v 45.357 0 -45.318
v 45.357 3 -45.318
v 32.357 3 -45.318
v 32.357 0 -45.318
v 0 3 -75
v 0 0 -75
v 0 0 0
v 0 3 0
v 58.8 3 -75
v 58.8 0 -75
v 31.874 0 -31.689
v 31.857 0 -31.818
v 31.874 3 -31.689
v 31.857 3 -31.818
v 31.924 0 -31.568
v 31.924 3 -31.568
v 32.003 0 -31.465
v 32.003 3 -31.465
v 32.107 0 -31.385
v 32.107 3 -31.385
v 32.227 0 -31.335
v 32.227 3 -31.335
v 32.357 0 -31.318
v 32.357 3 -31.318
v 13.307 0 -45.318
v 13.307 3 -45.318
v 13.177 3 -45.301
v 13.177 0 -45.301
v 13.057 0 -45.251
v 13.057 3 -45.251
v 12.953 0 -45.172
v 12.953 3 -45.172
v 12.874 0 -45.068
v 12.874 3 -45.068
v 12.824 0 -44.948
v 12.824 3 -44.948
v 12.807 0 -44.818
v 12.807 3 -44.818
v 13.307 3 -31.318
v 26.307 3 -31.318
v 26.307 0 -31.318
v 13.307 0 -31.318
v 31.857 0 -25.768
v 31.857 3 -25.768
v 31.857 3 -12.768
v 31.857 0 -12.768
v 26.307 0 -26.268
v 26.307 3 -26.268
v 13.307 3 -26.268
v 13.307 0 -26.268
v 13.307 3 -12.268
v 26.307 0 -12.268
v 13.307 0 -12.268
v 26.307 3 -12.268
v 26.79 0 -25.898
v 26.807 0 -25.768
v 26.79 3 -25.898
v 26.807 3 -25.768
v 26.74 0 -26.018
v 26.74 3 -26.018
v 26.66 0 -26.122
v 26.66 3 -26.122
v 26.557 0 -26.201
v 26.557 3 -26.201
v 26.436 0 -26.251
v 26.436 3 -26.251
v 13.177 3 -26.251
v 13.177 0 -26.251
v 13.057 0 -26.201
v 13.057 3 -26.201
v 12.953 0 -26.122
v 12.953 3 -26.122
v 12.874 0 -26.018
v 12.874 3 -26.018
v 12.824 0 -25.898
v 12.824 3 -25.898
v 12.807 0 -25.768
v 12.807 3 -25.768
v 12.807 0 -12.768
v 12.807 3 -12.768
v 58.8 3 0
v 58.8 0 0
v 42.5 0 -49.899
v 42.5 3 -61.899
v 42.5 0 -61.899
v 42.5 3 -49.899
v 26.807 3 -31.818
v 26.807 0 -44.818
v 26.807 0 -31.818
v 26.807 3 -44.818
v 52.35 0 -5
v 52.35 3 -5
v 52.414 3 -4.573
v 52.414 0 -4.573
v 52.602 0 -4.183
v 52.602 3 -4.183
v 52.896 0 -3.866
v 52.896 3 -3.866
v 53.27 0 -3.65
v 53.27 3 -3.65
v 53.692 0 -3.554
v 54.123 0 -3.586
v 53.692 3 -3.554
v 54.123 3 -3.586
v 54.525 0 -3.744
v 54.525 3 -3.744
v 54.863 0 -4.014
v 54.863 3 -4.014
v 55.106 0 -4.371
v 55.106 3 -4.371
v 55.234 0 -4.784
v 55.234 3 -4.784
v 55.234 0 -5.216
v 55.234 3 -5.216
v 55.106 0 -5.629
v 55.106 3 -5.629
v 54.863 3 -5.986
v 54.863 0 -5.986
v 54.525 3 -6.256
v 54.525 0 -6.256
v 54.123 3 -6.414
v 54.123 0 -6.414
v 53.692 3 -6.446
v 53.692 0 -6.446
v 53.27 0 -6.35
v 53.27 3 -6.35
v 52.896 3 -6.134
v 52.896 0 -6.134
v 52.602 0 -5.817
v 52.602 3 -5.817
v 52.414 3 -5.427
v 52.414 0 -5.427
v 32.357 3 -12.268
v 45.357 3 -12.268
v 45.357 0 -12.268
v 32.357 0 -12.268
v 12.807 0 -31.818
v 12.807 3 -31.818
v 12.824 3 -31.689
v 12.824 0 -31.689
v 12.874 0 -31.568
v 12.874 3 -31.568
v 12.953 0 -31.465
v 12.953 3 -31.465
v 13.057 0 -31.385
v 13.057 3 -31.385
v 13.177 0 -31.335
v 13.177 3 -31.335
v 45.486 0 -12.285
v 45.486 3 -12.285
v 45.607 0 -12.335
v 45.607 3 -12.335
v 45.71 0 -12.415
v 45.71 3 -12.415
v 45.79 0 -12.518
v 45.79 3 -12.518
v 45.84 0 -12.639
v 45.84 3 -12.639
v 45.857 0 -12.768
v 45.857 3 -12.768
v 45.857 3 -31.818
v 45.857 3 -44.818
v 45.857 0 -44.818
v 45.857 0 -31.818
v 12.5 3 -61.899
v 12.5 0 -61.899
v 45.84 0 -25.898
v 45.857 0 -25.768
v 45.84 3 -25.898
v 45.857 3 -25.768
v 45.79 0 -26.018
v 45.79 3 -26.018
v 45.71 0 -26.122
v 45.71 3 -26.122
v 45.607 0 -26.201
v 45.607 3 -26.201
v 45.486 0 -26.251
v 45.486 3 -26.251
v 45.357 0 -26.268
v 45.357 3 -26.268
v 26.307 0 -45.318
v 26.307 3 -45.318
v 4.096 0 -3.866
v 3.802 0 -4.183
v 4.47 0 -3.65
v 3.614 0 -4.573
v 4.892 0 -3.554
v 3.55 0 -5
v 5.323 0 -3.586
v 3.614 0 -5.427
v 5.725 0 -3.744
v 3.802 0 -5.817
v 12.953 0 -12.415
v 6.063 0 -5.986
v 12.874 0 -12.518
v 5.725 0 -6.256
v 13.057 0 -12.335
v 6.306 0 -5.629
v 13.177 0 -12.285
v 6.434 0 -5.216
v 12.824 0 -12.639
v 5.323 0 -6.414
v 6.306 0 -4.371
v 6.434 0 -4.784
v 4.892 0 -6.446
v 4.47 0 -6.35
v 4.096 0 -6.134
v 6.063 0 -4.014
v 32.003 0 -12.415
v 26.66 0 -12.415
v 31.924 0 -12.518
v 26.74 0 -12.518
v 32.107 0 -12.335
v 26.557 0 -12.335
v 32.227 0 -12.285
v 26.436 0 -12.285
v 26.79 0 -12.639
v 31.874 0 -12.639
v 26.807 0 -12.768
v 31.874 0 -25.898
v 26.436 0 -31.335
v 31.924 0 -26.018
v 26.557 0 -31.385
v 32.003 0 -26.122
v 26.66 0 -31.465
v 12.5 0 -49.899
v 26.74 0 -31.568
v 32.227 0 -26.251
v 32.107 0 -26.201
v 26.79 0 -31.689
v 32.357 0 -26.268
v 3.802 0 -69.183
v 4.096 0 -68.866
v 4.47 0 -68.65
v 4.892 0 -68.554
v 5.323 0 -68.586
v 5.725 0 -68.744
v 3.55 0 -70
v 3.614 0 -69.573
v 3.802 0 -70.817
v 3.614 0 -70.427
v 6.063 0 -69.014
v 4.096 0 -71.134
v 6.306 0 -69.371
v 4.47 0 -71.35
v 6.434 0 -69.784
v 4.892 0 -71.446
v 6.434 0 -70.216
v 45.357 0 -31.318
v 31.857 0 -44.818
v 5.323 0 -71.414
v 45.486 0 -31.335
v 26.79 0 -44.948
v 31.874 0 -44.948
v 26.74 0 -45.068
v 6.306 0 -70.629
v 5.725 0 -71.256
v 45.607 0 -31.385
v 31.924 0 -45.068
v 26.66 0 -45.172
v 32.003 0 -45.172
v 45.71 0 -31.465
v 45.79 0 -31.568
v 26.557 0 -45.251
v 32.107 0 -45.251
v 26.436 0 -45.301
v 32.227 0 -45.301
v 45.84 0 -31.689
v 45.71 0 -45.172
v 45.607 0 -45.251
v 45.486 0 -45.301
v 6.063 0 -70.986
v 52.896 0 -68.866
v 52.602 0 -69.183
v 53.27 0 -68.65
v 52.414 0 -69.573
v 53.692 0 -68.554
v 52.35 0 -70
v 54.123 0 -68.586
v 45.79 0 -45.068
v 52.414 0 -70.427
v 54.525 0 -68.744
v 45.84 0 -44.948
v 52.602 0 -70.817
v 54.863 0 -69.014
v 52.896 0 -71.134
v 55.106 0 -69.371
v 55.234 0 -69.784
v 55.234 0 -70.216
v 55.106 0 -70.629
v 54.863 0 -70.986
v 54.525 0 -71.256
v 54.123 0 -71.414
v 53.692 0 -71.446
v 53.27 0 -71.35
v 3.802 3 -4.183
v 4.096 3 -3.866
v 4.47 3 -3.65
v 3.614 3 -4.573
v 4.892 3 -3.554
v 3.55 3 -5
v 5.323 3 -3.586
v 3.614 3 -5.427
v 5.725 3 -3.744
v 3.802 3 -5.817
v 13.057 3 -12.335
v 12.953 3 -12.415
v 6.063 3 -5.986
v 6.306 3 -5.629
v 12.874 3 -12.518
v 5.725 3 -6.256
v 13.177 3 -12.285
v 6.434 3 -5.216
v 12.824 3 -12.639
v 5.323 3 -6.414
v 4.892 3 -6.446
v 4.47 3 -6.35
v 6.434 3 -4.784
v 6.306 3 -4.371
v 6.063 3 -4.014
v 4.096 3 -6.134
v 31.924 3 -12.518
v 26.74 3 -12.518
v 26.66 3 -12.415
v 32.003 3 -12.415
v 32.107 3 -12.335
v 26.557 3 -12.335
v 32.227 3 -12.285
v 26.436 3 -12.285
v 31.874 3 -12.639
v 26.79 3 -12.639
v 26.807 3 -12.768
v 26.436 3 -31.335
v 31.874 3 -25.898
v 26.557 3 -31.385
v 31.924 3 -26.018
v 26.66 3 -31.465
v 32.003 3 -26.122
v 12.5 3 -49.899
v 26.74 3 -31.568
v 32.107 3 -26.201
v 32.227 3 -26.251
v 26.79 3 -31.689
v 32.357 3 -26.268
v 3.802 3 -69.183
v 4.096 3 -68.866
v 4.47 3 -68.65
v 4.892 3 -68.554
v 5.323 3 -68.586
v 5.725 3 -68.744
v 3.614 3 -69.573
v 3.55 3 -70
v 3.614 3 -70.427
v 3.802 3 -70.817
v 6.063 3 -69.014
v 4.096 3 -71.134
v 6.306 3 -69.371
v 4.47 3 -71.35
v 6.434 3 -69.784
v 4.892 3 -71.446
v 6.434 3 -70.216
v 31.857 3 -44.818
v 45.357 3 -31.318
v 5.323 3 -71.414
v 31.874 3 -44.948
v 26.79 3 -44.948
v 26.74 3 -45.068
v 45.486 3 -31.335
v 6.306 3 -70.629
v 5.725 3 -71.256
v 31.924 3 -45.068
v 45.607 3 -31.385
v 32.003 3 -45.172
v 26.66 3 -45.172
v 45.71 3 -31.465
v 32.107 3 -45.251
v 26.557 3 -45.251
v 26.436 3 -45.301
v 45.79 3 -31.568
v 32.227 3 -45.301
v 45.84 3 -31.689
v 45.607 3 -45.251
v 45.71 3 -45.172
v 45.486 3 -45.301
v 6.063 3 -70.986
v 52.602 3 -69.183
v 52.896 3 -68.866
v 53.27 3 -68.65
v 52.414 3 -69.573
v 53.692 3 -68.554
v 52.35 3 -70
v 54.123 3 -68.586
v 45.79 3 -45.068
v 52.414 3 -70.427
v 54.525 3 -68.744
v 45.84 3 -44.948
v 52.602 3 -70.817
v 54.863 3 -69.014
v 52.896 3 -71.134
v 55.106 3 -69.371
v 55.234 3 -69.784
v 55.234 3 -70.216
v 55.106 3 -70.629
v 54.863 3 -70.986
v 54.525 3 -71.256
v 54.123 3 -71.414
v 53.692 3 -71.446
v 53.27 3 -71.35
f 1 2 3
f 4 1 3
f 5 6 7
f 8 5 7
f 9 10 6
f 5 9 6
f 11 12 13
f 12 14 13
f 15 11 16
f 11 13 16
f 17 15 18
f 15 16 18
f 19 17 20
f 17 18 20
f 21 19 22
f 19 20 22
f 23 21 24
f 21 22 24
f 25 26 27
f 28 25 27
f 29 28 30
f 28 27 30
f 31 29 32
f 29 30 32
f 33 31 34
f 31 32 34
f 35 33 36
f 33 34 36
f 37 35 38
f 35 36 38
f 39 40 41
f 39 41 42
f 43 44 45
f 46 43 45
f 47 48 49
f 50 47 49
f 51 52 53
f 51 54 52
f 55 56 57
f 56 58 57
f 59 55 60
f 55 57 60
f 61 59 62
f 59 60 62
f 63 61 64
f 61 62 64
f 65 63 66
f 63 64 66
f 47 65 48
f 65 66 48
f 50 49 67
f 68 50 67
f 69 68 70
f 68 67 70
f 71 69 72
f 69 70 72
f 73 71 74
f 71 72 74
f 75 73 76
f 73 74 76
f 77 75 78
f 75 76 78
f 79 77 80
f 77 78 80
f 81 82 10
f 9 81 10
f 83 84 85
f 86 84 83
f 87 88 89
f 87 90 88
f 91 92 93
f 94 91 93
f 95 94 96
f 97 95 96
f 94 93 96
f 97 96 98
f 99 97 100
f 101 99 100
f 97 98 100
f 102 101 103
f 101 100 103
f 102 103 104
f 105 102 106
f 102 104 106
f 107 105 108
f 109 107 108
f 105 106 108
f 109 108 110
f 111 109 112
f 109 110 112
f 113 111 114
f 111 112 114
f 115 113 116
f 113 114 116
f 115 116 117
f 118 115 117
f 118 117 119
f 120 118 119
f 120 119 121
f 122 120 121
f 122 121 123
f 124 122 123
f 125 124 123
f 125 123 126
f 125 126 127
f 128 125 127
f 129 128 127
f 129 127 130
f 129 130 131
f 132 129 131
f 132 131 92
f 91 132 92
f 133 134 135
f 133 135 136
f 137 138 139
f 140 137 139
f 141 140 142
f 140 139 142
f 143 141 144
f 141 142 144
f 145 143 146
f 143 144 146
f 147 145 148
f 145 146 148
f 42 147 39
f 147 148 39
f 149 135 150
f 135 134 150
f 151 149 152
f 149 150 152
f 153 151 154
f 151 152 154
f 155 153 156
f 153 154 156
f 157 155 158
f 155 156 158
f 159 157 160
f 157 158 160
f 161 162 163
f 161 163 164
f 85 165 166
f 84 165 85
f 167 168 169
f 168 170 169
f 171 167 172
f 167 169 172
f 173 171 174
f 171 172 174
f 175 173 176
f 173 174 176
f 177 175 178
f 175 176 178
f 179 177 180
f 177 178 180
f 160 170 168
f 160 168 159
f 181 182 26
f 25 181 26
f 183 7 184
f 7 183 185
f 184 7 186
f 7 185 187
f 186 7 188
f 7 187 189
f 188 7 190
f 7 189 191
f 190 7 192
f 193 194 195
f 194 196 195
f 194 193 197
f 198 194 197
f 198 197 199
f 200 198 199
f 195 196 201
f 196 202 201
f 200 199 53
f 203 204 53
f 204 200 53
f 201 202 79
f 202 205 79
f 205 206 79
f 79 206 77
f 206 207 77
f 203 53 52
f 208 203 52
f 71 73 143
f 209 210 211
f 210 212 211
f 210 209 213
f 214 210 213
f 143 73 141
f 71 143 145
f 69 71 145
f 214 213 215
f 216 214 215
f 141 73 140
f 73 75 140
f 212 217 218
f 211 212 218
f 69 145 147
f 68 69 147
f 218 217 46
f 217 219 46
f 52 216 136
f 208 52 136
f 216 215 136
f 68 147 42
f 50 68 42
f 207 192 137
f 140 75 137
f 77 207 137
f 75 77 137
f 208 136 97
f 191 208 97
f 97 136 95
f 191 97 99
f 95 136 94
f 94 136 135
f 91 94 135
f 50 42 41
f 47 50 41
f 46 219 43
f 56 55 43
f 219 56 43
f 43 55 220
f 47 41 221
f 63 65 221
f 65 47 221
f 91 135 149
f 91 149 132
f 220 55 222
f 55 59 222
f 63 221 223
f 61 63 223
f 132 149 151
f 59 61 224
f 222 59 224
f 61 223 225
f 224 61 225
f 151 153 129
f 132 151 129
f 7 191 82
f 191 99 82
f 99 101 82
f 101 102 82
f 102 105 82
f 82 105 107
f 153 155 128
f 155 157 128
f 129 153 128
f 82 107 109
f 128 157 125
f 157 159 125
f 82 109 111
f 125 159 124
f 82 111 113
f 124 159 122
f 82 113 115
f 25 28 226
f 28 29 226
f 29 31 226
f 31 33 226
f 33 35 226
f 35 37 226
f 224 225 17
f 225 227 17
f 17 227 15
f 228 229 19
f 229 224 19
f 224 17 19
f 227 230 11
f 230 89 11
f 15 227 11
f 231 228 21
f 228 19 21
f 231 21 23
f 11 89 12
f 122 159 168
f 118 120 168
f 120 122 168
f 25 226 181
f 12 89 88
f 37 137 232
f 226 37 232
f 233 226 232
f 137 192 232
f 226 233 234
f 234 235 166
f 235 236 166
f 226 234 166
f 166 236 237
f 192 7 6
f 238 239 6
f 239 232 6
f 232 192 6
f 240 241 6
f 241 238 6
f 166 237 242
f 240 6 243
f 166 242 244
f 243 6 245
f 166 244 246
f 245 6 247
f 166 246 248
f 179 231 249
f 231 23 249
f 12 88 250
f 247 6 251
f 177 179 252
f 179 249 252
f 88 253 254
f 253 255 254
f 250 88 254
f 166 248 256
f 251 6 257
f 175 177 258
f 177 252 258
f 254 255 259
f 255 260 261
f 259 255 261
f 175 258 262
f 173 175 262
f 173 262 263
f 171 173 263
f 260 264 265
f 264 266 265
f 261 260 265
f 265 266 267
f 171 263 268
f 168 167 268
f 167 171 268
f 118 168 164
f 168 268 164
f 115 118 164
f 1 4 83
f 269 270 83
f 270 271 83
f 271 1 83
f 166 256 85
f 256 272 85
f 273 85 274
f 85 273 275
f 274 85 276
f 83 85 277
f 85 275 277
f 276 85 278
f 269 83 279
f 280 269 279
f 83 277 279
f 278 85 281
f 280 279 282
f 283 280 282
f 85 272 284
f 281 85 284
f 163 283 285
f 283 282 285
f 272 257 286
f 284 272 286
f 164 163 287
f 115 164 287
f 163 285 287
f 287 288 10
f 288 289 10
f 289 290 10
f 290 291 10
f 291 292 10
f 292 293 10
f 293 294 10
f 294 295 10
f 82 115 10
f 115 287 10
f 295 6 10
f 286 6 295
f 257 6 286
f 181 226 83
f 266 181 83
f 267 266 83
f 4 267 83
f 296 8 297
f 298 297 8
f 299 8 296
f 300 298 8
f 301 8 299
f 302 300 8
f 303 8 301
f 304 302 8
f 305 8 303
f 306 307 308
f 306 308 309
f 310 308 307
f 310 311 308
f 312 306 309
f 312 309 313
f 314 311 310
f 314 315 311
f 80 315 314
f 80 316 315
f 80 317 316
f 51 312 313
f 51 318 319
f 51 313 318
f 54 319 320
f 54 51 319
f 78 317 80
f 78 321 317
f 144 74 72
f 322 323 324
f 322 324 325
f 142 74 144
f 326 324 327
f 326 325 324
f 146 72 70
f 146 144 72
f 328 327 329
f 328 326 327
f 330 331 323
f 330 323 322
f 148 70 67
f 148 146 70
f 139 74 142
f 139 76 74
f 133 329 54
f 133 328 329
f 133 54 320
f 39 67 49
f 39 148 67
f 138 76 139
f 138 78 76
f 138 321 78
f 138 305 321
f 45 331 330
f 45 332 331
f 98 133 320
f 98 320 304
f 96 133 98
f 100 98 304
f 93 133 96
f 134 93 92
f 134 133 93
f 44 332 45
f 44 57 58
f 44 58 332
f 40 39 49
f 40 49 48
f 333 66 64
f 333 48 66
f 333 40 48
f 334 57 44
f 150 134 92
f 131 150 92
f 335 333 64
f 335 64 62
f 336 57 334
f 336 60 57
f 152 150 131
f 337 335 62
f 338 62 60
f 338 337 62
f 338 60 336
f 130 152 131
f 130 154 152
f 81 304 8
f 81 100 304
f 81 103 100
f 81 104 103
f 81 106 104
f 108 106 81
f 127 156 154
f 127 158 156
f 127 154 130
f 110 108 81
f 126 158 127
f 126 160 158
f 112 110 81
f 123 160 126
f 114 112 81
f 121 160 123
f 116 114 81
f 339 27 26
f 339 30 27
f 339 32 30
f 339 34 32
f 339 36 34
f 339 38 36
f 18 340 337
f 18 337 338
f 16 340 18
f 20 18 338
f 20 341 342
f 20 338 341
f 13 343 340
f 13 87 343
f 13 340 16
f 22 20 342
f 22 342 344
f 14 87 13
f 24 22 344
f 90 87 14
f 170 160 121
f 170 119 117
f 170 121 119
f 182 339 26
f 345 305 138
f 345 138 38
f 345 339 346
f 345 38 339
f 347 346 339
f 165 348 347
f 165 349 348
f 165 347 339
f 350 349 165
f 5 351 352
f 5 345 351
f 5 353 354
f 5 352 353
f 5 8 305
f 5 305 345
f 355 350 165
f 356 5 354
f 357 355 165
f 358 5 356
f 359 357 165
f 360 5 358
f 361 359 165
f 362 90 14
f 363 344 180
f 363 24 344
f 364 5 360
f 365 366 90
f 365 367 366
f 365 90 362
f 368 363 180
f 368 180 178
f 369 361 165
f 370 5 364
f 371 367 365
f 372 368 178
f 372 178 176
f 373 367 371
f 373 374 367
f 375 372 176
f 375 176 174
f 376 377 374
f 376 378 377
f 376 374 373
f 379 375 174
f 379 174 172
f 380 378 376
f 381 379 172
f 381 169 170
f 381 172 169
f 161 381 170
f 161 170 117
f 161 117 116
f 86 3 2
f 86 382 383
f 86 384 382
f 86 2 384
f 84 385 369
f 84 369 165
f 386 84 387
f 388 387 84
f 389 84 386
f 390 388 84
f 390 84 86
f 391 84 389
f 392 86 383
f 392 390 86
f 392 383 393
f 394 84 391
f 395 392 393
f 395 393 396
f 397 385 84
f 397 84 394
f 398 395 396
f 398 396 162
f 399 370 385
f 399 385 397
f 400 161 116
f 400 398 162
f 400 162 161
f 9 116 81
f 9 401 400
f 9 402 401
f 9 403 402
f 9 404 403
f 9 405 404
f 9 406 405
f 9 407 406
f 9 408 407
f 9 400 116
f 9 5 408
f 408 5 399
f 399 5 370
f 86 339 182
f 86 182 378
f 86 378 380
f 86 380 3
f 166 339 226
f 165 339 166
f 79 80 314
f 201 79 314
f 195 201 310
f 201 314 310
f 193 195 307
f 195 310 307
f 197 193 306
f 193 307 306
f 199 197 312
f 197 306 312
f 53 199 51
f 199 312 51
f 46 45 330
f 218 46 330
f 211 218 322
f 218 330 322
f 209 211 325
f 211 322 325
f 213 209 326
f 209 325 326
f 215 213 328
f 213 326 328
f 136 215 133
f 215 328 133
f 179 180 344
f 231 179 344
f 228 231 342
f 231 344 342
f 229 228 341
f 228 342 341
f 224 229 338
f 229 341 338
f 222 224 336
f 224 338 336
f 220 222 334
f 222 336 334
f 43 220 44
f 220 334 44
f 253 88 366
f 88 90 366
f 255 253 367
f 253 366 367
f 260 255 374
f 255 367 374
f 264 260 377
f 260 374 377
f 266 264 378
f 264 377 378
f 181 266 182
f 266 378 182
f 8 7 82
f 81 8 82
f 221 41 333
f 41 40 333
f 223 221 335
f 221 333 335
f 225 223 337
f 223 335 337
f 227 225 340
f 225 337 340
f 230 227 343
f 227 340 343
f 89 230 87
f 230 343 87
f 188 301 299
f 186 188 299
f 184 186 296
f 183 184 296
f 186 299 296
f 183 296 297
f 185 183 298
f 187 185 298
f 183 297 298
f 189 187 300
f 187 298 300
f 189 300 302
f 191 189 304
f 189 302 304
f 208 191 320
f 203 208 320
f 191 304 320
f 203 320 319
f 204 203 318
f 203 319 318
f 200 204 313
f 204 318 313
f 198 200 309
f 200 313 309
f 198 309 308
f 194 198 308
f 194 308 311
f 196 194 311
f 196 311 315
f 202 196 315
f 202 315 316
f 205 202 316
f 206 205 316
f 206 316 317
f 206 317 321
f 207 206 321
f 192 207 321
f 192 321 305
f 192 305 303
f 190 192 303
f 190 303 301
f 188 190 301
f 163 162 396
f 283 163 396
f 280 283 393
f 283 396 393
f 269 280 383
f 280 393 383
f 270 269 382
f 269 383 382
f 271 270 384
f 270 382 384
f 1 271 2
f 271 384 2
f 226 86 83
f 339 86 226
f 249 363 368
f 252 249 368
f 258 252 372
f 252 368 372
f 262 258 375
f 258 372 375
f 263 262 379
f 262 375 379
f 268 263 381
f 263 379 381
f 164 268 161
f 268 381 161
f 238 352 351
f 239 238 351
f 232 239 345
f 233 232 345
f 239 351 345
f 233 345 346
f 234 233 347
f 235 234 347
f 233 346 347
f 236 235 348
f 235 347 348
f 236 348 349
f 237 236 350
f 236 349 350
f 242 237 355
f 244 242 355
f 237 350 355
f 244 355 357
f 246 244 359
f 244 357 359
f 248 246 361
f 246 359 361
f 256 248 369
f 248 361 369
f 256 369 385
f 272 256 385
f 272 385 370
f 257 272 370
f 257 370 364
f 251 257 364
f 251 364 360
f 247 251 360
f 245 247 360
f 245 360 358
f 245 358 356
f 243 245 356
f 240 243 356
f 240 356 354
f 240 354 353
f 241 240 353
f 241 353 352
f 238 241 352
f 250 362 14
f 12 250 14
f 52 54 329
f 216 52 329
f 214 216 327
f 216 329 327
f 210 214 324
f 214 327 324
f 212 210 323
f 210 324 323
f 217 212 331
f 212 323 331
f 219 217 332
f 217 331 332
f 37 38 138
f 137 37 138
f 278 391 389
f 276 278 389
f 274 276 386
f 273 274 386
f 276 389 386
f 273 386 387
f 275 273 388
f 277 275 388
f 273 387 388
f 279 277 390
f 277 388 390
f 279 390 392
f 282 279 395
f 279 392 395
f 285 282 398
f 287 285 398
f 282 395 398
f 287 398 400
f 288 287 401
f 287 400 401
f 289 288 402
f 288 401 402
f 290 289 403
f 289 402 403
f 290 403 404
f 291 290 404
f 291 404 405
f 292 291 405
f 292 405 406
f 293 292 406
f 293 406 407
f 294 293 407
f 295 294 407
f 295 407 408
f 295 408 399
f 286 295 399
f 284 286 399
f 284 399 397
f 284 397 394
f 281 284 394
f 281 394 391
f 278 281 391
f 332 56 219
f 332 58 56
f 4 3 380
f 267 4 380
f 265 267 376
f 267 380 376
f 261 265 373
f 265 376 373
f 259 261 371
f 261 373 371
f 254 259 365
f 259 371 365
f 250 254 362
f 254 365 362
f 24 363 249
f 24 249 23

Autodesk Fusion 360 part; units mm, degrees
sketch "Sketch1" plane through (0, 0, 0) normal (0, 1, 0) x (1, 0, 0)
  line L0 (0, 0) -> (58.8, 0)
  line L1 (58.8, 0) -> (58.8, 75)
  line L2 (58.8, 75) -> (0, 75)
  line L3 (0, 75) -> (0, 0)
  dimension "d1" = 58.8
  dimension "d2" = 75
extrude "Extrude1" add sketch "Sketch1" along normal blind 3
sketch "Sketch2" plane through (0, 3, 0) normal (0, 1, 0) x (-1, 0, 0)
  line L0 (0, -75) -> (0, 0)
  line L1 (0, 0) -> (-58.8, 0)
  line L2 (-58.8, 0) -> (-58.8, -75)
  line L3 (-58.8, -75) -> (0, -75)
  line L4 (-10, -65) -> (-48.8, -65)
  line L5 (-48.8, -65) -> (-48.8, -10)
  line L6 (-48.8, -10) -> (-10, -10)
  line L7 (-10, -10) -> (-10, -65)
  dimension "d5" = 10
  dimension "d6" = 10
  dimension "d7" = 10
  dimension "d8" = 10
sketch "plate-2026-03-17T21_53_59.045Z" plane through (0, 3, 0) normal (0, 1, 0) x (0, 0, 1)
  line L0 (-44.8182, 45.8566) -> (-31.8182, 45.8566)
  line L1 (-44.8182, 31.8566) -> (-31.8182, 31.8566)
  line L2 (-45.3182, 45.3566) -> (-45.3182, 32.3566)
  line L3 (-31.3182, 45.3566) -> (-31.3182, 32.3566)
  arc A0 (-44.8182, 45.8566) -> (-45.3182, 45.3566) centre (-44.8182, 45.3566) ccw
  arc A1 (-31.3182, 45.3566) -> (-31.8182, 45.8566) centre (-31.8182, 45.3566) ccw
  arc A2 (-45.3182, 32.3566) -> (-44.8182, 31.8566) centre (-44.8182, 32.3566) ccw
  arc A3 (-31.8182, 31.8566) -> (-31.3182, 32.3566) centre (-31.8182, 32.3566) ccw
  line L4 (-25.7682, 45.8566) -> (-12.7682, 45.8566)
  line L5 (-25.7682, 31.8566) -> (-12.7682, 31.8566)
  line L6 (-26.2682, 45.3566) -> (-26.2682, 32.3566)
  line L7 (-12.2682, 45.3566) -> (-12.2682, 32.3566)
  arc A4 (-25.7682, 45.8566) -> (-26.2682, 45.3566) centre (-25.7682, 45.3566) ccw
  arc A5 (-12.2682, 45.3566) -> (-12.7682, 45.8566) centre (-12.7682, 45.3566) ccw
  arc A6 (-26.2682, 32.3566) -> (-25.7682, 31.8566) centre (-25.7682, 32.3566) ccw
  arc A7 (-12.7682, 31.8566) -> (-12.2682, 32.3566) centre (-12.7682, 32.3566) ccw
  line L8 (-44.8182, 26.8066) -> (-31.8182, 26.8066)
  line L9 (-44.8182, 12.8066) -> (-31.8182, 12.8066)
  line L10 (-45.3182, 26.3066) -> (-45.3182, 13.3066)
  line L11 (-31.3182, 26.3066) -> (-31.3182, 13.3066)
  arc A8 (-44.8182, 26.8066) -> (-45.3182, 26.3066) centre (-44.8182, 26.3066) ccw
  arc A9 (-31.3182, 26.3066) -> (-31.8182, 26.8066) centre (-31.8182, 26.3066) ccw
  arc A10 (-45.3182, 13.3066) -> (-44.8182, 12.8066) centre (-44.8182, 13.3066) ccw
  arc A11 (-31.8182, 12.8066) -> (-31.3182, 13.3066) centre (-31.8182, 13.3066) ccw
  line L12 (-25.7682, 26.8066) -> (-12.7682, 26.8066)
  line L13 (-25.7682, 12.8066) -> (-12.7682, 12.8066)
  line L14 (-26.2682, 26.3066) -> (-26.2682, 13.3066)
  line L15 (-12.2682, 26.3066) -> (-12.2682, 13.3066)
  arc A12 (-25.7682, 26.8066) -> (-26.2682, 26.3066) centre (-25.7682, 26.3066) ccw
  arc A13 (-12.2682, 26.3066) -> (-12.7682, 26.8066) centre (-12.7682, 26.3066) ccw
  arc A14 (-26.2682, 13.3066) -> (-25.7682, 12.8066) centre (-25.7682, 13.3066) ccw
  arc A15 (-12.7682, 12.8066) -> (-12.2682, 13.3066) centre (-12.7682, 13.3066) ccw
  line L16 (-47.8432, 10.2816) -> (-9.7432, 10.2816)
  line L17 (-47.8432, 48.3816) -> (-9.7432, 48.3816)
  line L18 (-47.8432, 10.2816) -> (-47.8432, 48.3816)
  line L19 (-9.7432, 10.2816) -> (-9.7432, 48.3816)
extrude "Extrude2" cut sketch "plate-2026-03-17T21_53_59.045Z" against normal blind 3 contours L0 L1 L2 L3 A0 A1 A2 A3 | L4 L5 L6 L7 A4 A5 A6 A7 | L8 L9 L10 L11 A8 A9 A10 A11 | L12 L13 L14 L15 A12 A13 A14 A15
sketch "Sketch4" plane through (0, 3, 0) normal (0, 1, 0) x (-1, 0, 0)
  line L0 (-12.5, -61.899) -> (-42.5, -61.899)
  line L1 (-42.5, -61.899) -> (-42.5, -49.899)
  line L2 (-42.5, -49.899) -> (-12.5, -49.899)
  line L3 (-12.5, -49.899) -> (-12.5, -61.899)
  line L4 (-10, -10) -> (-10, -65)
  dimension "d11" = 12
  dimension "d12" = 30
  dimension "d13" = 2.5
extrude "Extrude3" cut sketch "Sketch4" against normal blind 3
sketch "Sketch5" plane through (0, 3, 0) normal (0, 1, 0) x (-1, 0, 0)
  circle A0 centre (-5, -70) radius 1.45
  circle A1 centre (-5, -5) radius 1.45
  circle A2 centre (-53.8, -70) radius 1.45
  circle A3 centre (-53.8, -5) radius 1.45
  line L0 (-58.8, -75) -> (0, -75)
  line L1 (0, -75) -> (0, 0)
  line L2 (0, 0) -> (-58.8, 0)
  line L3 (-58.8, 0) -> (-58.8, -75)
  dimension "d16" = 2.9
  dimension "d17" = 2.9
  dimension "d18" = 2.9
  dimension "d19" = 2.9
  dimension "d20" = 5
  dimension "d21" = 5
  dimension "d22" = 5
  dimension "d23" = 5
  dimension "d24" = 5
  dimension "d25" = 5
  dimension "d26" = 5
  dimension "d27" = 5
extrude "Extrude4" cut sketch "Sketch5" against normal blind 3 contours A0 | A1 | A2 | A3
